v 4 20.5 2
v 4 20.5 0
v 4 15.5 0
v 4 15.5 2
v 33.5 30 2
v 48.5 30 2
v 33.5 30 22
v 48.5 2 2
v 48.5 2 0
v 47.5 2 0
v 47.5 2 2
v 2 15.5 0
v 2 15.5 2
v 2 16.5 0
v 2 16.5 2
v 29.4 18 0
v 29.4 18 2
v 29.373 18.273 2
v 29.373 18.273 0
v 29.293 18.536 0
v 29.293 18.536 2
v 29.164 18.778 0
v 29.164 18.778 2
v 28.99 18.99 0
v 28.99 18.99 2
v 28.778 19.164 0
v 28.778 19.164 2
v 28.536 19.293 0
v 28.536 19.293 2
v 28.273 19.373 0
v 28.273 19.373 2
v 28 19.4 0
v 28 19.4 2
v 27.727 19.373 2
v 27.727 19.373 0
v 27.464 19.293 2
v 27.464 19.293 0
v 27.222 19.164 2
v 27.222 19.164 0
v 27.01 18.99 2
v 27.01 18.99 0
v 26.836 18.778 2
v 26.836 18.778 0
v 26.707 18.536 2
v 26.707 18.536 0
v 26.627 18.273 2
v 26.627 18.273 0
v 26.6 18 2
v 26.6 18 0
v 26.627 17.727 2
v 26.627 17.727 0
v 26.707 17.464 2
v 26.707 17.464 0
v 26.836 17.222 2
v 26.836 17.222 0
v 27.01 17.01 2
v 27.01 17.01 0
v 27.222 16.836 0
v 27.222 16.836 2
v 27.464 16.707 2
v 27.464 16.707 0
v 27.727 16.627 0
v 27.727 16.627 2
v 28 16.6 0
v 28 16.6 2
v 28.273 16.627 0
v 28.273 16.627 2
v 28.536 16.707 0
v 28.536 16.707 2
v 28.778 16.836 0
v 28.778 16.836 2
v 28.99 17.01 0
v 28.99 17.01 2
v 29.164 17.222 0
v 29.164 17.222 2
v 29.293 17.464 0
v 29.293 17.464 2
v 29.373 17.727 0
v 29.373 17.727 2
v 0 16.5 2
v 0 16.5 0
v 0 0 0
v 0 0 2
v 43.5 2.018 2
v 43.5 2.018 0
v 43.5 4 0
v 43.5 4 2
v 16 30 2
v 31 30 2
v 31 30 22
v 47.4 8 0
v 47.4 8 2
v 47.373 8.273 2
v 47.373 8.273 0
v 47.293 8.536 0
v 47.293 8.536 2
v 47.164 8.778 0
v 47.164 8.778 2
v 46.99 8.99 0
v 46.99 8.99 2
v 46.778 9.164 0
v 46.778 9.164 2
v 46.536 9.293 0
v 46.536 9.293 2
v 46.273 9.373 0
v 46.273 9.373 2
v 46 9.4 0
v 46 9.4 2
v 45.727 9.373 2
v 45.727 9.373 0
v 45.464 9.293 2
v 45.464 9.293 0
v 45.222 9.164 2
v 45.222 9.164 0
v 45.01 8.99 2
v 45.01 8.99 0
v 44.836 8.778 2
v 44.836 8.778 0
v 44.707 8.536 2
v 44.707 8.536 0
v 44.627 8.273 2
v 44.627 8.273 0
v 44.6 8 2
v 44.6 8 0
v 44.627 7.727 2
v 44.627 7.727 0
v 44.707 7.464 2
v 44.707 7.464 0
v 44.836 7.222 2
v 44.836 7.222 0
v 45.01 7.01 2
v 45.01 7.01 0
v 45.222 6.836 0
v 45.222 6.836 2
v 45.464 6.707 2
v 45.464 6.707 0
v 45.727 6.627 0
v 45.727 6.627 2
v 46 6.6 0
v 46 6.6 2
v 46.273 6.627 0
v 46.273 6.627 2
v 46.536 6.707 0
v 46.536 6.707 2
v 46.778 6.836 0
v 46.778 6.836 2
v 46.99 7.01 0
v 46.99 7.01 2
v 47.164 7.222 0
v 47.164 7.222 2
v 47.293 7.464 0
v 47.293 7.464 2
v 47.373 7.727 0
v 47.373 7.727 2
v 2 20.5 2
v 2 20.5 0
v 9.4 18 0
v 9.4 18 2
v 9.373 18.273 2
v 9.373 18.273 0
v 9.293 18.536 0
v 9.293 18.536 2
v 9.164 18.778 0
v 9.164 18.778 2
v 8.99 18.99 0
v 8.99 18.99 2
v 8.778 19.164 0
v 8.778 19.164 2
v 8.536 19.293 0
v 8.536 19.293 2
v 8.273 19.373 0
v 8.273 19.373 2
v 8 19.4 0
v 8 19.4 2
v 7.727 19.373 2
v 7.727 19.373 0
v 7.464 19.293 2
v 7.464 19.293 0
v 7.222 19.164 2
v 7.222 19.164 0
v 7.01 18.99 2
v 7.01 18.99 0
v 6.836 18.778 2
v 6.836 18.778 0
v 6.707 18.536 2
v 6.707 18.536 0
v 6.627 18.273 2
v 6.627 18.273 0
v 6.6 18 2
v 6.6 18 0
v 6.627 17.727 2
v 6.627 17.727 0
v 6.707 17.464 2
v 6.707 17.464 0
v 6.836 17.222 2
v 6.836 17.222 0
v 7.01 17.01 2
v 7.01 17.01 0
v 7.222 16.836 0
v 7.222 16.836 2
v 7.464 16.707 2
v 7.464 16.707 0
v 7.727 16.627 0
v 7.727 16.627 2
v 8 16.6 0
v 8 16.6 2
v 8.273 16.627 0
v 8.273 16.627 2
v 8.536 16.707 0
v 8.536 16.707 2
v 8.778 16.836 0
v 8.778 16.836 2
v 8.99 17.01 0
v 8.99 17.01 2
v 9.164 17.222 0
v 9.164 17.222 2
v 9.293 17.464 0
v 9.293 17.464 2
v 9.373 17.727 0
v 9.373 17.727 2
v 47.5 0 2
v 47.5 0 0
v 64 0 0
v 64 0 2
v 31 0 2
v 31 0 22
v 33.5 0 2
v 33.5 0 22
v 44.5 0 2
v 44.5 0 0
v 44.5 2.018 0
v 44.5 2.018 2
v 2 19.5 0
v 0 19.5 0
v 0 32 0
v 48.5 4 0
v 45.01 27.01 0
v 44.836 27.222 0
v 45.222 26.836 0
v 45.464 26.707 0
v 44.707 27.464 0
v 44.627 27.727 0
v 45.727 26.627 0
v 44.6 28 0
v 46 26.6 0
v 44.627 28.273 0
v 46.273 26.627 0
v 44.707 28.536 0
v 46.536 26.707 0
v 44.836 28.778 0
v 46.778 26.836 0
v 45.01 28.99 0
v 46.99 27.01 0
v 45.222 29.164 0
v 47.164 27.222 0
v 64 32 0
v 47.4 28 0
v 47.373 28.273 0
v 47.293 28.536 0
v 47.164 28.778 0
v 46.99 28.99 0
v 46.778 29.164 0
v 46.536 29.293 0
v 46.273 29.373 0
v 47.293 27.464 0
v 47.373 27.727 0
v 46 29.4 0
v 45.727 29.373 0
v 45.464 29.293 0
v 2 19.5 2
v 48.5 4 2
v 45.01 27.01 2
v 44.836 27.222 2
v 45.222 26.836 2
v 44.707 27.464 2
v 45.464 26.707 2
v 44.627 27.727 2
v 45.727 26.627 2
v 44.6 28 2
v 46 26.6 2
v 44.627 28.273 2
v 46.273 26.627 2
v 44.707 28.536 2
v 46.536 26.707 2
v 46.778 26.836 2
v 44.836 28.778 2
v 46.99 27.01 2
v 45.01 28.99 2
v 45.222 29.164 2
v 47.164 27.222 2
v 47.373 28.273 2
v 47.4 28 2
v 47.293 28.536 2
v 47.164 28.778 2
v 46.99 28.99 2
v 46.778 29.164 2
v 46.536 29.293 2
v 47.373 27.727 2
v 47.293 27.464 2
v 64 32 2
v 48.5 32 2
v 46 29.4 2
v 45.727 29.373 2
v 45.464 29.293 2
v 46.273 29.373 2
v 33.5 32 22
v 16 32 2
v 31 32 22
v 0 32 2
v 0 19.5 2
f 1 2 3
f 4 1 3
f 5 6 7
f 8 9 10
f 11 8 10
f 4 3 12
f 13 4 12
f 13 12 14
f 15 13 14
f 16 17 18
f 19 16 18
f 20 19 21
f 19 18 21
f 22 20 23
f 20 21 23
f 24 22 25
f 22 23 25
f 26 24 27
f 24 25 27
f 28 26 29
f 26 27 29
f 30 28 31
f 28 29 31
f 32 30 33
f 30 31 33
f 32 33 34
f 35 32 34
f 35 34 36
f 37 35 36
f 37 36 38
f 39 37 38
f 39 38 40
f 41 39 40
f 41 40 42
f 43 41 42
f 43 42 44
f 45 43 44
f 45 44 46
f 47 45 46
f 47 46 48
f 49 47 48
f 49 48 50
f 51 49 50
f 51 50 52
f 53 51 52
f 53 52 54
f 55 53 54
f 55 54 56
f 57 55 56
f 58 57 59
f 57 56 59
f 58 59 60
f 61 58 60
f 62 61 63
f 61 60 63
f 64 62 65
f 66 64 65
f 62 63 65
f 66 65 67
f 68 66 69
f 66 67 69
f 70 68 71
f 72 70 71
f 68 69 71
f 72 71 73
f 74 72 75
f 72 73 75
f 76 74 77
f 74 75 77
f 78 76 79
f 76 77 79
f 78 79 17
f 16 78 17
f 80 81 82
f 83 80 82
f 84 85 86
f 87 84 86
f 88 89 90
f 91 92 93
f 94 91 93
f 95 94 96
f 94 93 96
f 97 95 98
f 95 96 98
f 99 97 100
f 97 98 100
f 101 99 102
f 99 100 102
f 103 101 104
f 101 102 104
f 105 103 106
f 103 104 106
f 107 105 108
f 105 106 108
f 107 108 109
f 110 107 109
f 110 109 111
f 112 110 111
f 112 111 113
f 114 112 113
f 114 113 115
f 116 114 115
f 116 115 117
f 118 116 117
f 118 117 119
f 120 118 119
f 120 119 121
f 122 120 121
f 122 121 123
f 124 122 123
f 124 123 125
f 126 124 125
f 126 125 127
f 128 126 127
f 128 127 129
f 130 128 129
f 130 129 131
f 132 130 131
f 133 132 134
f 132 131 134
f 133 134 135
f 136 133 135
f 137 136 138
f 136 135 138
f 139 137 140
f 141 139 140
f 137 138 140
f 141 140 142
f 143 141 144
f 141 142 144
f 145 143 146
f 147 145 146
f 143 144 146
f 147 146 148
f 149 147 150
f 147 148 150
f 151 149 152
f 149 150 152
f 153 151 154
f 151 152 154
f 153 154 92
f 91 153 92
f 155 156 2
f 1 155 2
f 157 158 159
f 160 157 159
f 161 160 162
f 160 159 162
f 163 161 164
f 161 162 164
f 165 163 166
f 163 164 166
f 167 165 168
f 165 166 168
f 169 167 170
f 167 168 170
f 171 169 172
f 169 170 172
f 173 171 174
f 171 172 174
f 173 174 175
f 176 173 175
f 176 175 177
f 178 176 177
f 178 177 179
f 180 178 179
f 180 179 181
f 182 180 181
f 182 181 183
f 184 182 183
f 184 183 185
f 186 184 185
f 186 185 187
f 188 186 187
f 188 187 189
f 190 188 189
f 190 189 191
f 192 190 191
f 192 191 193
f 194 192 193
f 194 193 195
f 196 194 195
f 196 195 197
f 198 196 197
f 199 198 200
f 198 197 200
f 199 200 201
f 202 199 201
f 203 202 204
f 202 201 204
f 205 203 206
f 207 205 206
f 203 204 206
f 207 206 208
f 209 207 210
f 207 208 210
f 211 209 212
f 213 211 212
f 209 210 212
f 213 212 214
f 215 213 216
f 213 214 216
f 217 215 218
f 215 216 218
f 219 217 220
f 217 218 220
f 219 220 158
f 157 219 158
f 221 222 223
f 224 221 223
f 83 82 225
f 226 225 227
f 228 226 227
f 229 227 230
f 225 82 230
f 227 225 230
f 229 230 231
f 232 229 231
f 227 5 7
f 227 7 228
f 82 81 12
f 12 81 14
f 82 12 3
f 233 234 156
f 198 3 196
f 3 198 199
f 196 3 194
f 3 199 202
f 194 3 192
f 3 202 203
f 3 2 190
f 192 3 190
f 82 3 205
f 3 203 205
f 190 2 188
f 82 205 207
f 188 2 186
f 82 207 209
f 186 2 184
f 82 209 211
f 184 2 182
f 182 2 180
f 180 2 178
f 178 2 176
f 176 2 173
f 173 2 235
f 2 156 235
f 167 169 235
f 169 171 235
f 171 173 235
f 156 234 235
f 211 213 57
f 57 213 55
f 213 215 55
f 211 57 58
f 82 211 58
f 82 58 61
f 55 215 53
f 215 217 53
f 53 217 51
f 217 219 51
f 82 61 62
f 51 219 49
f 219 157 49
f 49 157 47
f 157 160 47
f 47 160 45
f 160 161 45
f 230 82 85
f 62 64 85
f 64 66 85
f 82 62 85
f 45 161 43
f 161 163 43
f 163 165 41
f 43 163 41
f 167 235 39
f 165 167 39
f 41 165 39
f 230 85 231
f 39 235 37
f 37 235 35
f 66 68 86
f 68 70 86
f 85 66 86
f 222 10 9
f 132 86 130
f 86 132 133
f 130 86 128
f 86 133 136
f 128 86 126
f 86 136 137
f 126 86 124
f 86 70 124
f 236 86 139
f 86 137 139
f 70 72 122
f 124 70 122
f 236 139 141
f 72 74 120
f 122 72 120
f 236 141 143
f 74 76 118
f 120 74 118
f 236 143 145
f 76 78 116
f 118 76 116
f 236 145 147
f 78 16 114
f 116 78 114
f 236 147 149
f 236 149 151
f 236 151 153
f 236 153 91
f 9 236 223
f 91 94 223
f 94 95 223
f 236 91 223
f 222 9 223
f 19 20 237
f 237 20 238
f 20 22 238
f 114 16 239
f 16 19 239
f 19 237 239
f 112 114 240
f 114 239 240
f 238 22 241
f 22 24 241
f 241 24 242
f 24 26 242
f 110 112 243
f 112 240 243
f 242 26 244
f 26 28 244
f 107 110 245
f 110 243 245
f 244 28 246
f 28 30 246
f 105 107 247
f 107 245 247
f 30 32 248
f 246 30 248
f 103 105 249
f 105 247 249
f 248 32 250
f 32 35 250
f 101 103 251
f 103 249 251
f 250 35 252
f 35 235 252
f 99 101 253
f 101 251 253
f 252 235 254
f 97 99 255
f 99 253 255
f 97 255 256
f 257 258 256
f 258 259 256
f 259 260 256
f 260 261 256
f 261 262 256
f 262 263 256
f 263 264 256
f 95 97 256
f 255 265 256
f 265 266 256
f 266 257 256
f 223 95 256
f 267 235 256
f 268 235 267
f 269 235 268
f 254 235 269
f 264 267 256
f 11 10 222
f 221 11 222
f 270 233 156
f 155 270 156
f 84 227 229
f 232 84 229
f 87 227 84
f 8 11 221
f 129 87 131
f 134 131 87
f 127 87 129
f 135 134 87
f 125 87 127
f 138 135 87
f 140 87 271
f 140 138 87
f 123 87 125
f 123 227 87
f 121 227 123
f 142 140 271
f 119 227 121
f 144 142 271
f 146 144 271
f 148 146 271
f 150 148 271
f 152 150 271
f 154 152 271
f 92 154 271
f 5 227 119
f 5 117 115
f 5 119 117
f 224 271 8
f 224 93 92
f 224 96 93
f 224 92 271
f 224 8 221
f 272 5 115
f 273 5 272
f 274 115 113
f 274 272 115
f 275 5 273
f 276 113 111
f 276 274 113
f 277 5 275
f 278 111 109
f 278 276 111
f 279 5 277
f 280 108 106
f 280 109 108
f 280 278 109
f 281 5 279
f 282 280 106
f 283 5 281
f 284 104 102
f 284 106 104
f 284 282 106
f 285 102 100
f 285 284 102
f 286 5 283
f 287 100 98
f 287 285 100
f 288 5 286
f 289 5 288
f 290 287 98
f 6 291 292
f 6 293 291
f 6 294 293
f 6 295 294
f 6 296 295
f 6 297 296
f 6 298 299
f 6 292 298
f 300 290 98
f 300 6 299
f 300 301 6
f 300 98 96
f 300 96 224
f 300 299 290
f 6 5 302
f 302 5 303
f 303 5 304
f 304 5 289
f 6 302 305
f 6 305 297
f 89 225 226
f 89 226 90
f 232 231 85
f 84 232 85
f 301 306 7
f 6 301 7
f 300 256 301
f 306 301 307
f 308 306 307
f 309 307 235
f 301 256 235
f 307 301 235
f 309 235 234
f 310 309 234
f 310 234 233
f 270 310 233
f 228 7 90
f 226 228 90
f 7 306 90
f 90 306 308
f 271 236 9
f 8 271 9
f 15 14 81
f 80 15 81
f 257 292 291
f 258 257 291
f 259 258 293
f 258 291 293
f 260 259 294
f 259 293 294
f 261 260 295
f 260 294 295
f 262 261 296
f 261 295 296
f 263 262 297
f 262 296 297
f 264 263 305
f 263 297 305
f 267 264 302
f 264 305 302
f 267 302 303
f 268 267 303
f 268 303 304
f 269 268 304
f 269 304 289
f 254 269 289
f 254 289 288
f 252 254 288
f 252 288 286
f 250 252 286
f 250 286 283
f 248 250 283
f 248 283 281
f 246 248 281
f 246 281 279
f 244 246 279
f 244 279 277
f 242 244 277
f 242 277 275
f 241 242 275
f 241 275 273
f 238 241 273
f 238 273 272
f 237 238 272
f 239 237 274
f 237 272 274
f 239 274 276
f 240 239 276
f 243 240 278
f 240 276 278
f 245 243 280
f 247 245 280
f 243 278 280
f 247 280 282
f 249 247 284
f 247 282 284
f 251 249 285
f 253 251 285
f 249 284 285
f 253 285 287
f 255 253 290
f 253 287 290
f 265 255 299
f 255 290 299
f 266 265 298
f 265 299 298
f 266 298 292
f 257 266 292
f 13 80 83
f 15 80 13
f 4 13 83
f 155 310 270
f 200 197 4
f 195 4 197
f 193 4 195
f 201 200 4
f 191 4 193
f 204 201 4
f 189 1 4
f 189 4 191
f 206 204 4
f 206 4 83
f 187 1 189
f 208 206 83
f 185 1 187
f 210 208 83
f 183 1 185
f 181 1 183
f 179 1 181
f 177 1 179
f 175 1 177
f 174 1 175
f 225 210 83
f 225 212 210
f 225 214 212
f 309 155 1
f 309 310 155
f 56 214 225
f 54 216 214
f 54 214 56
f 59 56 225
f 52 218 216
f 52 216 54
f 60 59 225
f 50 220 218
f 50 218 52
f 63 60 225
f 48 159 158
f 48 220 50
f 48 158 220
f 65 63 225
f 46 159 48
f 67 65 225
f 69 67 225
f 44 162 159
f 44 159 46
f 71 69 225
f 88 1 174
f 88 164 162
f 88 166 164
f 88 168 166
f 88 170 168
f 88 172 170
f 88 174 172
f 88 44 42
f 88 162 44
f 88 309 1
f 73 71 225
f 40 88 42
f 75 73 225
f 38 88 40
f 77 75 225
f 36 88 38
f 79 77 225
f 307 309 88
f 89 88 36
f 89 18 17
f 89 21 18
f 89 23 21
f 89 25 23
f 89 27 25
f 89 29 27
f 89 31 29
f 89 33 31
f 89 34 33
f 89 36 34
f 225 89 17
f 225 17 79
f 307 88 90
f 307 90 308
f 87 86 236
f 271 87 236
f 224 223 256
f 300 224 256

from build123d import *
from OCP.BRepFilletAPI import BRepFilletAPI_MakeChamfer

# Parameters (mm, degrees)
BOSS_EXTRU_1_DEPTH      = 2
BOSS_EXTRU_2_DEPTH      = 20
ESQUISSE2_R             = 1.4
ENL_V_MAT_EXTRU_1_DEPTH = 75.296702484
CHANFREIN1_SIZE         = 15
CHANFREIN1_SIZE_2       = 20


with BuildPart() as part:
    # Esquisse1 → Boss.-Extru.1 (new body)
    with BuildSketch(Plane.XY):
        Polygon((0, 0), (43.5, 0), (44.5, 0), (44.5, 2.018181818), (43.5, 2.018181818), (43.5, 4), (48.5, 4), (48.5, 2), (47.5, 2), (47.5, 0), (48.5, 0), (64, 0), (64, 32), (0, 32), (0, 19.5), (2, 19.5), (2, 20.5), (4, 20.5), (4, 15.5), (2, 15.5), (2, 16.5), (0, 16.5), (0, 13.5), align=None)
    extrude(amount=BOSS_EXTRU_1_DEPTH)

    # Esquisse3 → Boss.-Extru.2 (add)
    with BuildSketch(Plane.XY.offset(2)):
        Polygon((26.917717359, 32), (29.417717359, 32), (48.5, 32), (48.5, 30), (33.5, 30), (33.5, 0), (31, 0), (31, 30), (16, 30), (16, 32), align=None)
    extrude(amount=BOSS_EXTRU_2_DEPTH)

    # Esquisse2 → Enlèv. mat.-Extru.1 (cut, through all)
    with BuildSketch(Plane.XY.offset(2)):
        with Locations((8, 18)):
            Circle(ESQUISSE2_R)
        with Locations((28, 18)):
            Circle(ESQUISSE2_R)
        with Locations((46, 28)):
            Circle(ESQUISSE2_R)
        with Locations((46, 8)):
            Circle(ESQUISSE2_R)
    extrude(amount=-ENL_V_MAT_EXTRU_1_DEPTH, mode=Mode.SUBTRACT)

    # Chanfrein1
    chanfrein1_edges_1 = [part.edges().sort_by_distance(p)[0] for p in [
        (48.5, 31, 22),
    ]]
    chanfrein1_side_1 = [part.faces().sort_by_distance(p)[0] for p in [
        (48.2, 31, 22),
    ]]
    chanfrein1_edges_2 = [part.edges().sort_by_distance(p)[0] for p in [
        (16, 31, 22),
    ]]
    chanfrein1_side_2 = [part.faces().sort_by_distance(p)[0] for p in [
        (16.3, 31, 22),
    ]]
    chanfrein1 = BRepFilletAPI_MakeChamfer(part.part.solid().wrapped)
    for e in chanfrein1_edges_1:
        chanfrein1.Add(CHANFREIN1_SIZE - 0.0001, CHANFREIN1_SIZE_2 - 0.0001, e.wrapped, chanfrein1_side_1[0].wrapped)
    for e in chanfrein1_edges_2:
        chanfrein1.Add(CHANFREIN1_SIZE - 0.0001, CHANFREIN1_SIZE_2 - 0.0001, e.wrapped, chanfrein1_side_2[0].wrapped)
    add(Compound.cast(chanfrein1.Shape()), mode=Mode.REPLACE)  # a hair under: the kernel refuses the full size


solid = part.part
